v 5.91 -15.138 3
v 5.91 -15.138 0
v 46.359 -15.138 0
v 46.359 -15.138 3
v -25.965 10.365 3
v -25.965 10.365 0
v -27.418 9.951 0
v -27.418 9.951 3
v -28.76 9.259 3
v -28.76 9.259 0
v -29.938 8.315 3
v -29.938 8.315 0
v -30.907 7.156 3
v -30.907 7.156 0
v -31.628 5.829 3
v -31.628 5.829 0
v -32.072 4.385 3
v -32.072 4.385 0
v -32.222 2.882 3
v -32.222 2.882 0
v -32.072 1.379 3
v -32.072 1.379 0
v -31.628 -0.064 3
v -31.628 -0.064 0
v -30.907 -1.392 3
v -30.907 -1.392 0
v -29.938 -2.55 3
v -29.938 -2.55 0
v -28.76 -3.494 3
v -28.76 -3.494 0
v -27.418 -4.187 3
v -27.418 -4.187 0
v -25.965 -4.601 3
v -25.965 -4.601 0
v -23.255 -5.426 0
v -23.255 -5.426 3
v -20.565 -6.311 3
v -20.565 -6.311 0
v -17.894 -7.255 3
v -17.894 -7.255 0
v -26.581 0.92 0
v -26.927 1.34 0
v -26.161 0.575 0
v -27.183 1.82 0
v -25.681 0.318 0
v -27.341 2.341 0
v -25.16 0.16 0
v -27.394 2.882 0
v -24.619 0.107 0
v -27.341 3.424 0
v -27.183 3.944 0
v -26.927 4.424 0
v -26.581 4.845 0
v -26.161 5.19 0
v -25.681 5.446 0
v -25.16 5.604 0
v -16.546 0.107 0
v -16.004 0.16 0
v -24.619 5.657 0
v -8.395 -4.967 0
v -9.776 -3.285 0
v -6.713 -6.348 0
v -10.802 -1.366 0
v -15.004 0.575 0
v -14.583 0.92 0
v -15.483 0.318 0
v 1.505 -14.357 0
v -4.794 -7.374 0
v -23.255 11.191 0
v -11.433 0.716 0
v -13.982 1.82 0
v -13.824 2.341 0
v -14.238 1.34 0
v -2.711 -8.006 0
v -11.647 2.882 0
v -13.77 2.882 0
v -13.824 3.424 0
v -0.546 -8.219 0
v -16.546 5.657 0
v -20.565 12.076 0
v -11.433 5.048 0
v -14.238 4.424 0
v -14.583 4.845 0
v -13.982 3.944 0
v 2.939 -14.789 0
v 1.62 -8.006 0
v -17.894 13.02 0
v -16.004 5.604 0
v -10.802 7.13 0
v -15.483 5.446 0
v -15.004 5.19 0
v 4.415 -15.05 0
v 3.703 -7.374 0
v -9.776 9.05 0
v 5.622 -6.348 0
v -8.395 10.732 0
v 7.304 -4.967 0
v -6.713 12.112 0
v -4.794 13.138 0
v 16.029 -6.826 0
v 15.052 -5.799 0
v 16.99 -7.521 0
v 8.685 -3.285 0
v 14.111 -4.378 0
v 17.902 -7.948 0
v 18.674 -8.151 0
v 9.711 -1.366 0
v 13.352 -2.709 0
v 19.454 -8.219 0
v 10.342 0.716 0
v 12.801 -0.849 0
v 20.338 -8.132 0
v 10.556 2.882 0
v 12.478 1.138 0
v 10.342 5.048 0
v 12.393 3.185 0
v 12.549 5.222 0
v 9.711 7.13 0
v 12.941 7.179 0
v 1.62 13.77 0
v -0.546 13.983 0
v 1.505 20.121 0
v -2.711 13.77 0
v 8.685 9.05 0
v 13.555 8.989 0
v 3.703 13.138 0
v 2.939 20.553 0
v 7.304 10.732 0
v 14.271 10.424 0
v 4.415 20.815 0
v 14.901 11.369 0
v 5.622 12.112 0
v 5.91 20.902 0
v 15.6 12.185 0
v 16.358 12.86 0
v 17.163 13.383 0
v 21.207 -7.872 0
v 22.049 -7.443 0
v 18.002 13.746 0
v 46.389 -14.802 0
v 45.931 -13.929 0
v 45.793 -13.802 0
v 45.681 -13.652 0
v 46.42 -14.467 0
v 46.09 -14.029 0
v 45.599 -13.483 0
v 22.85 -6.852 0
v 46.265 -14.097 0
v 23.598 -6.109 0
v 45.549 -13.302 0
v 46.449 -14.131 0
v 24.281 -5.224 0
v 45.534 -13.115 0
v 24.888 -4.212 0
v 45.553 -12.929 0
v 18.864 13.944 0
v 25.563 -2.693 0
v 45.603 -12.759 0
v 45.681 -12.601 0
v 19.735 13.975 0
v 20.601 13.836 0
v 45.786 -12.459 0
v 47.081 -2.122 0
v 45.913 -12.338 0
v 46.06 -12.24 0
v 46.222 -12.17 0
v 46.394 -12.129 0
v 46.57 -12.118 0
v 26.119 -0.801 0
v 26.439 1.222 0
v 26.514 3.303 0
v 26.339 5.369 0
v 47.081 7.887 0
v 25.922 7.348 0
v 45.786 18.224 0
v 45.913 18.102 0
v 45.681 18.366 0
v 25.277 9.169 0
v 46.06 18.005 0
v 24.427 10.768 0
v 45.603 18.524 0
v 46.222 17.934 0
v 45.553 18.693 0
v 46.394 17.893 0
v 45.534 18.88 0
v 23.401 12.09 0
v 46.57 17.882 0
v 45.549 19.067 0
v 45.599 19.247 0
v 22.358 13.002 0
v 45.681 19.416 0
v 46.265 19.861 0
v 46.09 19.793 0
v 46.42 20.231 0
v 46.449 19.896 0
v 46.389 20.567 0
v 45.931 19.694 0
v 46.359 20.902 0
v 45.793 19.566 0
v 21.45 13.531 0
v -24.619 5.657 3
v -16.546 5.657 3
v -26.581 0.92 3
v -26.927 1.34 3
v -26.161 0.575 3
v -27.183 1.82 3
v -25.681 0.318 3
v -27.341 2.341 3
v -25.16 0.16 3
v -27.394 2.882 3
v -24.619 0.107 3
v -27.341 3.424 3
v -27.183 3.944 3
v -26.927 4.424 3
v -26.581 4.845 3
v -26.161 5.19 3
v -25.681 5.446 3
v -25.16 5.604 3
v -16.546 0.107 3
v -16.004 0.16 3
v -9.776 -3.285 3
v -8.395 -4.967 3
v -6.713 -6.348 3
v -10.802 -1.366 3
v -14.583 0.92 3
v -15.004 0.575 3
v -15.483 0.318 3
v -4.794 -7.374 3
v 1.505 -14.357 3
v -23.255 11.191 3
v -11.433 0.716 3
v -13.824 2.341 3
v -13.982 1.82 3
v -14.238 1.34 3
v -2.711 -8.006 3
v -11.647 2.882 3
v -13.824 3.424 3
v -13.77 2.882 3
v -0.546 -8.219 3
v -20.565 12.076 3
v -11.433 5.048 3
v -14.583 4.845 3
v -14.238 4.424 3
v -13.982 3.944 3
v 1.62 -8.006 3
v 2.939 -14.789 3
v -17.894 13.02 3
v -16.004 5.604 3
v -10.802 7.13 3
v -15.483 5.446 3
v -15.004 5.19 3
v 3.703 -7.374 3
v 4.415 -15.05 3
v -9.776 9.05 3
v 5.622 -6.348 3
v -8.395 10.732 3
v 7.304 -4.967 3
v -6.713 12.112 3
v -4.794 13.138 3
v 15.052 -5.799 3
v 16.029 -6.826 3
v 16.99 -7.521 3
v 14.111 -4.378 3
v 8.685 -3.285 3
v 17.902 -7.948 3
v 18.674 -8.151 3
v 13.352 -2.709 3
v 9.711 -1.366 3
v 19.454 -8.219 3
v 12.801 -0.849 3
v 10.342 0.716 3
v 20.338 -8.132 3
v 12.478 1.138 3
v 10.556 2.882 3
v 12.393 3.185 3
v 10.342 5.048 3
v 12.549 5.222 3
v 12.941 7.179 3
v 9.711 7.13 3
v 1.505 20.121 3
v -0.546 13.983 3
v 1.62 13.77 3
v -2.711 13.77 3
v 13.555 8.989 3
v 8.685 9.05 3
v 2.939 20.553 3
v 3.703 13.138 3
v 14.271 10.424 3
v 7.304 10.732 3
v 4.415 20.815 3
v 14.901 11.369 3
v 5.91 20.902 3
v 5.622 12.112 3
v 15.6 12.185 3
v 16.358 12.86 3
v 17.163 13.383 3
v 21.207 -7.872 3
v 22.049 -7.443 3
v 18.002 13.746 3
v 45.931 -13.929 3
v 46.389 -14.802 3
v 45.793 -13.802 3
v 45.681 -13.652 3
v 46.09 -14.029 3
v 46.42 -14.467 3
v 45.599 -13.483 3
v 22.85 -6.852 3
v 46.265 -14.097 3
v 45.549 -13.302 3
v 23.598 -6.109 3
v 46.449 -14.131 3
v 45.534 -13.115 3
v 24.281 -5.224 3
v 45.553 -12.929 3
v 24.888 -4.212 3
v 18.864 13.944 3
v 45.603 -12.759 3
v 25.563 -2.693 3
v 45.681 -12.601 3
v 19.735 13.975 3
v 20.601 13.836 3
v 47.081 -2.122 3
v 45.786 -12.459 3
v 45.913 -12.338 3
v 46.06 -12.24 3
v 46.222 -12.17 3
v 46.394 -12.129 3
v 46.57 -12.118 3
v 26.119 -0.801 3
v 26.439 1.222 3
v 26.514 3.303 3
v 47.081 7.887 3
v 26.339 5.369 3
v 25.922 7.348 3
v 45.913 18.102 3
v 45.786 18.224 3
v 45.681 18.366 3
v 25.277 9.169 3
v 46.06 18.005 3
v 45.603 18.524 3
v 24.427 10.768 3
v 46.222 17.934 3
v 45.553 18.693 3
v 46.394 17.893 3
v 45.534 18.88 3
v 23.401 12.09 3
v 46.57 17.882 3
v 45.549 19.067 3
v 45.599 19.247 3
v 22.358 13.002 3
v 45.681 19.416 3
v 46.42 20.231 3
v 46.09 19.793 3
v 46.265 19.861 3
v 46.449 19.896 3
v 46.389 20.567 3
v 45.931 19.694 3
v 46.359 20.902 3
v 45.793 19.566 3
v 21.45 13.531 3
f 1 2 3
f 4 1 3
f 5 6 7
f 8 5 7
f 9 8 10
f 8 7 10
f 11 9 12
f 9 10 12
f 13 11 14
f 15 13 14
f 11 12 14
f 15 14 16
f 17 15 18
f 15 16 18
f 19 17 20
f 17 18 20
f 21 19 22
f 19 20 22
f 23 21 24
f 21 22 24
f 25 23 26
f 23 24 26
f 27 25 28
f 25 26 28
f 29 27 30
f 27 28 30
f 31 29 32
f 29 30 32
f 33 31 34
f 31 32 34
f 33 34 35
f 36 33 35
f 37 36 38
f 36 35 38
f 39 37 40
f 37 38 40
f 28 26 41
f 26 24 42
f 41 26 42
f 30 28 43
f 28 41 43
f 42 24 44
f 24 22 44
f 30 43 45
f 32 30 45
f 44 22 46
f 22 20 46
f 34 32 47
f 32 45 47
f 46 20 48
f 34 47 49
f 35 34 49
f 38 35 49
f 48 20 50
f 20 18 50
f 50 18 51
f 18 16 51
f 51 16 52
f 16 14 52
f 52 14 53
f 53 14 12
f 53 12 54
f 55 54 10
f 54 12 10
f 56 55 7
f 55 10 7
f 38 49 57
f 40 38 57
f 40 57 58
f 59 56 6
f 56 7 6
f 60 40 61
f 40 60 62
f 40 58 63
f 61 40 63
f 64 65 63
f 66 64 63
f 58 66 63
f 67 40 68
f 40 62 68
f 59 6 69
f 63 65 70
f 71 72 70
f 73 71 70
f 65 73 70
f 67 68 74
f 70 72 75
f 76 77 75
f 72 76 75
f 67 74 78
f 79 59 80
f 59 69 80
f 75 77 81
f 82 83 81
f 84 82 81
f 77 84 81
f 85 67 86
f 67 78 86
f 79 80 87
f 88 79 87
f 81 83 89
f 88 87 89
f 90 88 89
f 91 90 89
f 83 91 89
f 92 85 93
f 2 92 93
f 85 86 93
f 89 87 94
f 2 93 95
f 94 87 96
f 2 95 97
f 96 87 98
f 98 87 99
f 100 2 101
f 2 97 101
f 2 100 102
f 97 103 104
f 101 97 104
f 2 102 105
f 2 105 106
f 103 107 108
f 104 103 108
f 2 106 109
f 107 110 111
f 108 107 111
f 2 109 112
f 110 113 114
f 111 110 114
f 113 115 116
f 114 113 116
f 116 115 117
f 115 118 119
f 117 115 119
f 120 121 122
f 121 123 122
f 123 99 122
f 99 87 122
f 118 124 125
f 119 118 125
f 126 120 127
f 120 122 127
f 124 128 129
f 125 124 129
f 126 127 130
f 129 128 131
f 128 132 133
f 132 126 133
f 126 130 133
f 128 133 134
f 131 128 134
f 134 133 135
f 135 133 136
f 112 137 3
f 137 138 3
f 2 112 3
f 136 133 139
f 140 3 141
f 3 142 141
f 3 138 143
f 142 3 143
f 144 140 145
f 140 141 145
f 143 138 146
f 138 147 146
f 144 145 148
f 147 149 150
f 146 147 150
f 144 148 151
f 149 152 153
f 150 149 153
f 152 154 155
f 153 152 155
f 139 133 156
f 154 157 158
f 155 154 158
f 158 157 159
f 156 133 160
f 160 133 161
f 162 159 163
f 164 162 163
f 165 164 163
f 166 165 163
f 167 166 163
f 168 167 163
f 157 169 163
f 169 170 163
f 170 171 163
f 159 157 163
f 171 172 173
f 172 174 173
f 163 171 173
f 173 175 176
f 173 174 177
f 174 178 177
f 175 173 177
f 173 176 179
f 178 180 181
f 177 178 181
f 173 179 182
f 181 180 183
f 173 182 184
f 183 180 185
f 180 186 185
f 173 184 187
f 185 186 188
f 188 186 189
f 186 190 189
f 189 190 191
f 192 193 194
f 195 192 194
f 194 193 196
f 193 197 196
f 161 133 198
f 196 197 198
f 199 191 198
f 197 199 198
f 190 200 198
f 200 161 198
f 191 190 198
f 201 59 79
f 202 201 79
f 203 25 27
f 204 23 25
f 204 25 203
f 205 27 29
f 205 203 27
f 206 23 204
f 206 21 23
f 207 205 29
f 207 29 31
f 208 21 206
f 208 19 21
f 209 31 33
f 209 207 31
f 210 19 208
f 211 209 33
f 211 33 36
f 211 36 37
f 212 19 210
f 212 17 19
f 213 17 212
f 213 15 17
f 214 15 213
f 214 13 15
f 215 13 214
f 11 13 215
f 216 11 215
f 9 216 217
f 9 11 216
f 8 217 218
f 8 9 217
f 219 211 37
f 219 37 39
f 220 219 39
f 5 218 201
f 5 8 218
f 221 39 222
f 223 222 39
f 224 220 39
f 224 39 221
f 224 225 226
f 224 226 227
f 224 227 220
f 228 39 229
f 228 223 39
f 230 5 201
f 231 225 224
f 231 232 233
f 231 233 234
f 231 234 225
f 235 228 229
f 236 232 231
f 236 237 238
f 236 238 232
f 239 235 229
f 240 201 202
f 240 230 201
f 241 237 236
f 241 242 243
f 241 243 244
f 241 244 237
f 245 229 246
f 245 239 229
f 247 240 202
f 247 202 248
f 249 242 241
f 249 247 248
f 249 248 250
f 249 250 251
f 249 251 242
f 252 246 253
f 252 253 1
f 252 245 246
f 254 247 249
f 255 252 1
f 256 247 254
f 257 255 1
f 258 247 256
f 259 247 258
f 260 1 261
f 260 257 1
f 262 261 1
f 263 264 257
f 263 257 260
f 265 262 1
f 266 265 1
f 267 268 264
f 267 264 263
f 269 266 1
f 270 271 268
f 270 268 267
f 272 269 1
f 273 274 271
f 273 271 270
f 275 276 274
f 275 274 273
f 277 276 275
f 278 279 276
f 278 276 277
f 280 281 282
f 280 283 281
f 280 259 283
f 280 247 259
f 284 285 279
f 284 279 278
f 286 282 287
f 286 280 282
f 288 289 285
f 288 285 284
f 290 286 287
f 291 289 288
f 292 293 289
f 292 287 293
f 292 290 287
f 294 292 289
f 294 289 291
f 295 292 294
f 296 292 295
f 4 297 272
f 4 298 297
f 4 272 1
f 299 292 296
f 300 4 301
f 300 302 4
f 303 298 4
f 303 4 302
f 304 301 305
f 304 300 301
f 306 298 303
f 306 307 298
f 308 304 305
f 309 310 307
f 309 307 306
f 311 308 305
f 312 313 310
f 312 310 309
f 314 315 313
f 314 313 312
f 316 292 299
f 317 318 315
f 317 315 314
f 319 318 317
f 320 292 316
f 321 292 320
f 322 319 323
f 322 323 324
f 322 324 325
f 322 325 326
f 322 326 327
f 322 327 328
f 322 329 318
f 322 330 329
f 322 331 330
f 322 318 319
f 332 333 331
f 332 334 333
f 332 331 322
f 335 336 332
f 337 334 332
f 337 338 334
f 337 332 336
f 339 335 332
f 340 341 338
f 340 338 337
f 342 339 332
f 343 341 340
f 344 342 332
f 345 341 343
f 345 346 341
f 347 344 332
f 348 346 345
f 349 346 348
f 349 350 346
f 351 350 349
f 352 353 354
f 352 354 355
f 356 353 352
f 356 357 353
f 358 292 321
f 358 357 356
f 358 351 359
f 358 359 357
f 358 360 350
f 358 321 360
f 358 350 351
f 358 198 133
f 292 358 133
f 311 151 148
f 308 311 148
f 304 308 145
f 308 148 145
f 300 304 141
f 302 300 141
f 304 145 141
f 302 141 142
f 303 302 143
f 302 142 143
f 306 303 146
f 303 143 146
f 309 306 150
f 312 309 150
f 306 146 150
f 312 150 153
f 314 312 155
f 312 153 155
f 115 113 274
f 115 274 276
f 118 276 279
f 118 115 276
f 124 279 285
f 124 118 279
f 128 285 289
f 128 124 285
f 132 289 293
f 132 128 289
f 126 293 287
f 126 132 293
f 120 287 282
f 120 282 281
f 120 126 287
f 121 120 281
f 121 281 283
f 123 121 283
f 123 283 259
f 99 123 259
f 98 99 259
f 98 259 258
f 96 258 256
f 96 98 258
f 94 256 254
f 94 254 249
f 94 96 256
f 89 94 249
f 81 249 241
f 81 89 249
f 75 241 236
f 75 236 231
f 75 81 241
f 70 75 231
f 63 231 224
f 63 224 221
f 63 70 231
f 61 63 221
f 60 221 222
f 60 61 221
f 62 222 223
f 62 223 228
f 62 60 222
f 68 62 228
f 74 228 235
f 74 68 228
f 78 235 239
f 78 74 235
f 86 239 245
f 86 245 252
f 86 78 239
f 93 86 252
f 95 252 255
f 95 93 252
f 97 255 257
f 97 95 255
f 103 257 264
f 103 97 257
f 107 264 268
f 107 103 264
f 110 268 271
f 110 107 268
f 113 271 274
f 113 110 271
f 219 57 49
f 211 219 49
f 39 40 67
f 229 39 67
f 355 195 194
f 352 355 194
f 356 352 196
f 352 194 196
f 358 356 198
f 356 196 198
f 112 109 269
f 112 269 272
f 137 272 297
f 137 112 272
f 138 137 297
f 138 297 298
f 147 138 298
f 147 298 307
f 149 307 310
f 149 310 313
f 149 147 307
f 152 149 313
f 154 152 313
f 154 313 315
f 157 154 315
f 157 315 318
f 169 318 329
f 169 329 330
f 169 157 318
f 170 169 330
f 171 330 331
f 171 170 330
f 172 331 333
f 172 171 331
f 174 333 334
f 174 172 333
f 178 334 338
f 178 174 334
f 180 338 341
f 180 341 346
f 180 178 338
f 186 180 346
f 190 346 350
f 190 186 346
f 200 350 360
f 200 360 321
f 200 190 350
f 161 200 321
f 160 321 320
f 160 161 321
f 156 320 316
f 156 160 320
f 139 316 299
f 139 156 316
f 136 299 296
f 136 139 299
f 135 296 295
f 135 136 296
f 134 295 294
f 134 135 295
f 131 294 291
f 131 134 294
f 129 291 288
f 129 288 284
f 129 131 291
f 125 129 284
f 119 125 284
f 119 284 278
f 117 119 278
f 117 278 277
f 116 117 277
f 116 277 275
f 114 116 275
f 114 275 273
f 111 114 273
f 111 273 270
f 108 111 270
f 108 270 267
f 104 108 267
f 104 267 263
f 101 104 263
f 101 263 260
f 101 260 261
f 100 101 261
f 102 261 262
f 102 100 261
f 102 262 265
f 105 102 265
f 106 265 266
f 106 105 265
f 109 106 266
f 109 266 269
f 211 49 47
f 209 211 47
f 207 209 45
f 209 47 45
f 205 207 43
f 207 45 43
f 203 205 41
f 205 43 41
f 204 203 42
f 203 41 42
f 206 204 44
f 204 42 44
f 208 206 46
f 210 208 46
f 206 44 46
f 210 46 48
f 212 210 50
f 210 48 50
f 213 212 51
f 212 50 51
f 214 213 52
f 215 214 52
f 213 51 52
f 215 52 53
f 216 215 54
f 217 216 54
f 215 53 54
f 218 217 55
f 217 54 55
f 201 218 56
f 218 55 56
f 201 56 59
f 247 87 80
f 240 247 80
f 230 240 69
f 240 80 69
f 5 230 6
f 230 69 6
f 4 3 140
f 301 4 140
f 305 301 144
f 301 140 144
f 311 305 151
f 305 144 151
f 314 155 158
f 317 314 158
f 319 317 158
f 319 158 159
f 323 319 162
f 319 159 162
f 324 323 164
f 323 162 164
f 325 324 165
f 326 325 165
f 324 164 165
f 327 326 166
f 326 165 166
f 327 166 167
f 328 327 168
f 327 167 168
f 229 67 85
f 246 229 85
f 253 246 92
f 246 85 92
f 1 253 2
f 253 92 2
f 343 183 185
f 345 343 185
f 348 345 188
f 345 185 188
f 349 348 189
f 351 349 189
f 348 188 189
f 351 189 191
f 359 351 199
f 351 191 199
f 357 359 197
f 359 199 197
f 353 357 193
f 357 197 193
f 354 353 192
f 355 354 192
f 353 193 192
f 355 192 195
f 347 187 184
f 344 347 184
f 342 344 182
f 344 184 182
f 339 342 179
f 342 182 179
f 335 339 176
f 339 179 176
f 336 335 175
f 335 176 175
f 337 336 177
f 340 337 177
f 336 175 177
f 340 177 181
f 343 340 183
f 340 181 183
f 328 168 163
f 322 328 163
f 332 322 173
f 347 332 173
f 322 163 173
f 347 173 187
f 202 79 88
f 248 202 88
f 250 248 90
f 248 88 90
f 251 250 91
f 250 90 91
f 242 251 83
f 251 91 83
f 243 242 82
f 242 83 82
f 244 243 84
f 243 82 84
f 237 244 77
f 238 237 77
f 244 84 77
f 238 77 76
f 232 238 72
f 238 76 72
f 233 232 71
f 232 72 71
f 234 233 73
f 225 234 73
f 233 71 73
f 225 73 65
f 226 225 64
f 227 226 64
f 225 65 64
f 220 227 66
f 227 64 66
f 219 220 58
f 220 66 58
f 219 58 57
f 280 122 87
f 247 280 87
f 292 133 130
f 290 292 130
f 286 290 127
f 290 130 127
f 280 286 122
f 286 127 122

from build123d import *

# Parameters (mm, degrees)
SKETCH1_R           = 11.1010859
SKETCH1_RX          = 11.1010859
SKETCH1_RY          = 7.064327391
BOSS_EXTRUDE1_DEPTH = 3


with BuildPart() as part:
    # Sketch1 → Boss-Extrude1 (new body)
    with BuildSketch(Plane.XY):
        with BuildLine():
            Line((-17.894214973, -7.255421854), (1.504545567, -14.356753838))
            ThreePointArc((1.504545567, -14.356753838), (3.673142738, -14.941061094), (5.91044133, -15.137844409))
            Line((5.91044133, -15.137844409), (28.826197236, -15.137844409))
            Line((28.826197236, -15.137844409), (46.358712744, -15.137844409))
            ThreePointArc((46.358712744, -15.137844409), (46.404537835, -14.634718136), (46.449065208, -14.131475353))
            ThreePointArc((46.449065208, -14.131475353), (45.733406698, -13.729506595), (45.553147083, -12.928724192))
            ThreePointArc((45.553147083, -12.928724192), (45.913364237, -12.337750174), (46.569590651, -12.117810222))
            ThreePointArc((46.569590651, -12.117810222), (47.144860113, 2.882189778), (46.569590651, 17.882189778))
            ThreePointArc((46.569590651, 17.882189778), (45.913364237, 18.102129729), (45.553147083, 18.693103748))
            ThreePointArc((45.553147083, 18.693103748), (45.733406698, 19.49388615), (46.449065208, 19.895854908))
            ThreePointArc((46.449065208, 19.895854908), (46.404537835, 20.399097691), (46.358712744, 20.902223964))
            Line((46.358712744, 20.902223964), (28.826197236, 20.902223964))
            Line((28.826197236, 20.902223964), (5.91044133, 20.902223964))
            ThreePointArc((5.91044133, 20.902223964), (3.673142738, 20.70544065), (1.504545567, 20.121133393))
            Line((1.504545567, 20.121133393), (-17.894214973, 13.019801409))
            ThreePointArc((-17.894214973, 13.019801409), (-21.907637047, 11.625593721), (-25.965065064, 10.365177235))
            ThreePointArc((-25.965065064, 10.365177235), (-32.222134734, 2.882189778), (-25.965065064, -4.60079768))
            ThreePointArc((-25.965065064, -4.60079768), (-21.907637047, -5.861214166), (-17.894214973, -7.255421854))
        make_face()
        with Locations((-0.54553615, 2.882189778)):
            Circle(SKETCH1_R, mode=Mode.SUBTRACT)
        with Locations(Location((19.45446385, 2.882189778), (0, 0, -90))):
            Ellipse(SKETCH1_RX, SKETCH1_RY, mode=Mode.SUBTRACT)
        with BuildLine():
            Line((-16.54553615, 0.106918303), (-24.619053168, 0.106918303))
            ThreePointArc((-24.619053168, 0.106918303), (-27.394324643, 2.882189778), (-24.619053168, 5.657461252))
            Line((-24.619053168, 5.657461252), (-16.54553615, 5.657461252))
            ThreePointArc((-16.54553615, 5.657461252), (-13.770264675, 2.882189778), (-16.54553615, 0.106918303))
        make_face(mode=Mode.SUBTRACT)
    extrude(amount=BOSS_EXTRUDE1_DEPTH)


solid = part.part
